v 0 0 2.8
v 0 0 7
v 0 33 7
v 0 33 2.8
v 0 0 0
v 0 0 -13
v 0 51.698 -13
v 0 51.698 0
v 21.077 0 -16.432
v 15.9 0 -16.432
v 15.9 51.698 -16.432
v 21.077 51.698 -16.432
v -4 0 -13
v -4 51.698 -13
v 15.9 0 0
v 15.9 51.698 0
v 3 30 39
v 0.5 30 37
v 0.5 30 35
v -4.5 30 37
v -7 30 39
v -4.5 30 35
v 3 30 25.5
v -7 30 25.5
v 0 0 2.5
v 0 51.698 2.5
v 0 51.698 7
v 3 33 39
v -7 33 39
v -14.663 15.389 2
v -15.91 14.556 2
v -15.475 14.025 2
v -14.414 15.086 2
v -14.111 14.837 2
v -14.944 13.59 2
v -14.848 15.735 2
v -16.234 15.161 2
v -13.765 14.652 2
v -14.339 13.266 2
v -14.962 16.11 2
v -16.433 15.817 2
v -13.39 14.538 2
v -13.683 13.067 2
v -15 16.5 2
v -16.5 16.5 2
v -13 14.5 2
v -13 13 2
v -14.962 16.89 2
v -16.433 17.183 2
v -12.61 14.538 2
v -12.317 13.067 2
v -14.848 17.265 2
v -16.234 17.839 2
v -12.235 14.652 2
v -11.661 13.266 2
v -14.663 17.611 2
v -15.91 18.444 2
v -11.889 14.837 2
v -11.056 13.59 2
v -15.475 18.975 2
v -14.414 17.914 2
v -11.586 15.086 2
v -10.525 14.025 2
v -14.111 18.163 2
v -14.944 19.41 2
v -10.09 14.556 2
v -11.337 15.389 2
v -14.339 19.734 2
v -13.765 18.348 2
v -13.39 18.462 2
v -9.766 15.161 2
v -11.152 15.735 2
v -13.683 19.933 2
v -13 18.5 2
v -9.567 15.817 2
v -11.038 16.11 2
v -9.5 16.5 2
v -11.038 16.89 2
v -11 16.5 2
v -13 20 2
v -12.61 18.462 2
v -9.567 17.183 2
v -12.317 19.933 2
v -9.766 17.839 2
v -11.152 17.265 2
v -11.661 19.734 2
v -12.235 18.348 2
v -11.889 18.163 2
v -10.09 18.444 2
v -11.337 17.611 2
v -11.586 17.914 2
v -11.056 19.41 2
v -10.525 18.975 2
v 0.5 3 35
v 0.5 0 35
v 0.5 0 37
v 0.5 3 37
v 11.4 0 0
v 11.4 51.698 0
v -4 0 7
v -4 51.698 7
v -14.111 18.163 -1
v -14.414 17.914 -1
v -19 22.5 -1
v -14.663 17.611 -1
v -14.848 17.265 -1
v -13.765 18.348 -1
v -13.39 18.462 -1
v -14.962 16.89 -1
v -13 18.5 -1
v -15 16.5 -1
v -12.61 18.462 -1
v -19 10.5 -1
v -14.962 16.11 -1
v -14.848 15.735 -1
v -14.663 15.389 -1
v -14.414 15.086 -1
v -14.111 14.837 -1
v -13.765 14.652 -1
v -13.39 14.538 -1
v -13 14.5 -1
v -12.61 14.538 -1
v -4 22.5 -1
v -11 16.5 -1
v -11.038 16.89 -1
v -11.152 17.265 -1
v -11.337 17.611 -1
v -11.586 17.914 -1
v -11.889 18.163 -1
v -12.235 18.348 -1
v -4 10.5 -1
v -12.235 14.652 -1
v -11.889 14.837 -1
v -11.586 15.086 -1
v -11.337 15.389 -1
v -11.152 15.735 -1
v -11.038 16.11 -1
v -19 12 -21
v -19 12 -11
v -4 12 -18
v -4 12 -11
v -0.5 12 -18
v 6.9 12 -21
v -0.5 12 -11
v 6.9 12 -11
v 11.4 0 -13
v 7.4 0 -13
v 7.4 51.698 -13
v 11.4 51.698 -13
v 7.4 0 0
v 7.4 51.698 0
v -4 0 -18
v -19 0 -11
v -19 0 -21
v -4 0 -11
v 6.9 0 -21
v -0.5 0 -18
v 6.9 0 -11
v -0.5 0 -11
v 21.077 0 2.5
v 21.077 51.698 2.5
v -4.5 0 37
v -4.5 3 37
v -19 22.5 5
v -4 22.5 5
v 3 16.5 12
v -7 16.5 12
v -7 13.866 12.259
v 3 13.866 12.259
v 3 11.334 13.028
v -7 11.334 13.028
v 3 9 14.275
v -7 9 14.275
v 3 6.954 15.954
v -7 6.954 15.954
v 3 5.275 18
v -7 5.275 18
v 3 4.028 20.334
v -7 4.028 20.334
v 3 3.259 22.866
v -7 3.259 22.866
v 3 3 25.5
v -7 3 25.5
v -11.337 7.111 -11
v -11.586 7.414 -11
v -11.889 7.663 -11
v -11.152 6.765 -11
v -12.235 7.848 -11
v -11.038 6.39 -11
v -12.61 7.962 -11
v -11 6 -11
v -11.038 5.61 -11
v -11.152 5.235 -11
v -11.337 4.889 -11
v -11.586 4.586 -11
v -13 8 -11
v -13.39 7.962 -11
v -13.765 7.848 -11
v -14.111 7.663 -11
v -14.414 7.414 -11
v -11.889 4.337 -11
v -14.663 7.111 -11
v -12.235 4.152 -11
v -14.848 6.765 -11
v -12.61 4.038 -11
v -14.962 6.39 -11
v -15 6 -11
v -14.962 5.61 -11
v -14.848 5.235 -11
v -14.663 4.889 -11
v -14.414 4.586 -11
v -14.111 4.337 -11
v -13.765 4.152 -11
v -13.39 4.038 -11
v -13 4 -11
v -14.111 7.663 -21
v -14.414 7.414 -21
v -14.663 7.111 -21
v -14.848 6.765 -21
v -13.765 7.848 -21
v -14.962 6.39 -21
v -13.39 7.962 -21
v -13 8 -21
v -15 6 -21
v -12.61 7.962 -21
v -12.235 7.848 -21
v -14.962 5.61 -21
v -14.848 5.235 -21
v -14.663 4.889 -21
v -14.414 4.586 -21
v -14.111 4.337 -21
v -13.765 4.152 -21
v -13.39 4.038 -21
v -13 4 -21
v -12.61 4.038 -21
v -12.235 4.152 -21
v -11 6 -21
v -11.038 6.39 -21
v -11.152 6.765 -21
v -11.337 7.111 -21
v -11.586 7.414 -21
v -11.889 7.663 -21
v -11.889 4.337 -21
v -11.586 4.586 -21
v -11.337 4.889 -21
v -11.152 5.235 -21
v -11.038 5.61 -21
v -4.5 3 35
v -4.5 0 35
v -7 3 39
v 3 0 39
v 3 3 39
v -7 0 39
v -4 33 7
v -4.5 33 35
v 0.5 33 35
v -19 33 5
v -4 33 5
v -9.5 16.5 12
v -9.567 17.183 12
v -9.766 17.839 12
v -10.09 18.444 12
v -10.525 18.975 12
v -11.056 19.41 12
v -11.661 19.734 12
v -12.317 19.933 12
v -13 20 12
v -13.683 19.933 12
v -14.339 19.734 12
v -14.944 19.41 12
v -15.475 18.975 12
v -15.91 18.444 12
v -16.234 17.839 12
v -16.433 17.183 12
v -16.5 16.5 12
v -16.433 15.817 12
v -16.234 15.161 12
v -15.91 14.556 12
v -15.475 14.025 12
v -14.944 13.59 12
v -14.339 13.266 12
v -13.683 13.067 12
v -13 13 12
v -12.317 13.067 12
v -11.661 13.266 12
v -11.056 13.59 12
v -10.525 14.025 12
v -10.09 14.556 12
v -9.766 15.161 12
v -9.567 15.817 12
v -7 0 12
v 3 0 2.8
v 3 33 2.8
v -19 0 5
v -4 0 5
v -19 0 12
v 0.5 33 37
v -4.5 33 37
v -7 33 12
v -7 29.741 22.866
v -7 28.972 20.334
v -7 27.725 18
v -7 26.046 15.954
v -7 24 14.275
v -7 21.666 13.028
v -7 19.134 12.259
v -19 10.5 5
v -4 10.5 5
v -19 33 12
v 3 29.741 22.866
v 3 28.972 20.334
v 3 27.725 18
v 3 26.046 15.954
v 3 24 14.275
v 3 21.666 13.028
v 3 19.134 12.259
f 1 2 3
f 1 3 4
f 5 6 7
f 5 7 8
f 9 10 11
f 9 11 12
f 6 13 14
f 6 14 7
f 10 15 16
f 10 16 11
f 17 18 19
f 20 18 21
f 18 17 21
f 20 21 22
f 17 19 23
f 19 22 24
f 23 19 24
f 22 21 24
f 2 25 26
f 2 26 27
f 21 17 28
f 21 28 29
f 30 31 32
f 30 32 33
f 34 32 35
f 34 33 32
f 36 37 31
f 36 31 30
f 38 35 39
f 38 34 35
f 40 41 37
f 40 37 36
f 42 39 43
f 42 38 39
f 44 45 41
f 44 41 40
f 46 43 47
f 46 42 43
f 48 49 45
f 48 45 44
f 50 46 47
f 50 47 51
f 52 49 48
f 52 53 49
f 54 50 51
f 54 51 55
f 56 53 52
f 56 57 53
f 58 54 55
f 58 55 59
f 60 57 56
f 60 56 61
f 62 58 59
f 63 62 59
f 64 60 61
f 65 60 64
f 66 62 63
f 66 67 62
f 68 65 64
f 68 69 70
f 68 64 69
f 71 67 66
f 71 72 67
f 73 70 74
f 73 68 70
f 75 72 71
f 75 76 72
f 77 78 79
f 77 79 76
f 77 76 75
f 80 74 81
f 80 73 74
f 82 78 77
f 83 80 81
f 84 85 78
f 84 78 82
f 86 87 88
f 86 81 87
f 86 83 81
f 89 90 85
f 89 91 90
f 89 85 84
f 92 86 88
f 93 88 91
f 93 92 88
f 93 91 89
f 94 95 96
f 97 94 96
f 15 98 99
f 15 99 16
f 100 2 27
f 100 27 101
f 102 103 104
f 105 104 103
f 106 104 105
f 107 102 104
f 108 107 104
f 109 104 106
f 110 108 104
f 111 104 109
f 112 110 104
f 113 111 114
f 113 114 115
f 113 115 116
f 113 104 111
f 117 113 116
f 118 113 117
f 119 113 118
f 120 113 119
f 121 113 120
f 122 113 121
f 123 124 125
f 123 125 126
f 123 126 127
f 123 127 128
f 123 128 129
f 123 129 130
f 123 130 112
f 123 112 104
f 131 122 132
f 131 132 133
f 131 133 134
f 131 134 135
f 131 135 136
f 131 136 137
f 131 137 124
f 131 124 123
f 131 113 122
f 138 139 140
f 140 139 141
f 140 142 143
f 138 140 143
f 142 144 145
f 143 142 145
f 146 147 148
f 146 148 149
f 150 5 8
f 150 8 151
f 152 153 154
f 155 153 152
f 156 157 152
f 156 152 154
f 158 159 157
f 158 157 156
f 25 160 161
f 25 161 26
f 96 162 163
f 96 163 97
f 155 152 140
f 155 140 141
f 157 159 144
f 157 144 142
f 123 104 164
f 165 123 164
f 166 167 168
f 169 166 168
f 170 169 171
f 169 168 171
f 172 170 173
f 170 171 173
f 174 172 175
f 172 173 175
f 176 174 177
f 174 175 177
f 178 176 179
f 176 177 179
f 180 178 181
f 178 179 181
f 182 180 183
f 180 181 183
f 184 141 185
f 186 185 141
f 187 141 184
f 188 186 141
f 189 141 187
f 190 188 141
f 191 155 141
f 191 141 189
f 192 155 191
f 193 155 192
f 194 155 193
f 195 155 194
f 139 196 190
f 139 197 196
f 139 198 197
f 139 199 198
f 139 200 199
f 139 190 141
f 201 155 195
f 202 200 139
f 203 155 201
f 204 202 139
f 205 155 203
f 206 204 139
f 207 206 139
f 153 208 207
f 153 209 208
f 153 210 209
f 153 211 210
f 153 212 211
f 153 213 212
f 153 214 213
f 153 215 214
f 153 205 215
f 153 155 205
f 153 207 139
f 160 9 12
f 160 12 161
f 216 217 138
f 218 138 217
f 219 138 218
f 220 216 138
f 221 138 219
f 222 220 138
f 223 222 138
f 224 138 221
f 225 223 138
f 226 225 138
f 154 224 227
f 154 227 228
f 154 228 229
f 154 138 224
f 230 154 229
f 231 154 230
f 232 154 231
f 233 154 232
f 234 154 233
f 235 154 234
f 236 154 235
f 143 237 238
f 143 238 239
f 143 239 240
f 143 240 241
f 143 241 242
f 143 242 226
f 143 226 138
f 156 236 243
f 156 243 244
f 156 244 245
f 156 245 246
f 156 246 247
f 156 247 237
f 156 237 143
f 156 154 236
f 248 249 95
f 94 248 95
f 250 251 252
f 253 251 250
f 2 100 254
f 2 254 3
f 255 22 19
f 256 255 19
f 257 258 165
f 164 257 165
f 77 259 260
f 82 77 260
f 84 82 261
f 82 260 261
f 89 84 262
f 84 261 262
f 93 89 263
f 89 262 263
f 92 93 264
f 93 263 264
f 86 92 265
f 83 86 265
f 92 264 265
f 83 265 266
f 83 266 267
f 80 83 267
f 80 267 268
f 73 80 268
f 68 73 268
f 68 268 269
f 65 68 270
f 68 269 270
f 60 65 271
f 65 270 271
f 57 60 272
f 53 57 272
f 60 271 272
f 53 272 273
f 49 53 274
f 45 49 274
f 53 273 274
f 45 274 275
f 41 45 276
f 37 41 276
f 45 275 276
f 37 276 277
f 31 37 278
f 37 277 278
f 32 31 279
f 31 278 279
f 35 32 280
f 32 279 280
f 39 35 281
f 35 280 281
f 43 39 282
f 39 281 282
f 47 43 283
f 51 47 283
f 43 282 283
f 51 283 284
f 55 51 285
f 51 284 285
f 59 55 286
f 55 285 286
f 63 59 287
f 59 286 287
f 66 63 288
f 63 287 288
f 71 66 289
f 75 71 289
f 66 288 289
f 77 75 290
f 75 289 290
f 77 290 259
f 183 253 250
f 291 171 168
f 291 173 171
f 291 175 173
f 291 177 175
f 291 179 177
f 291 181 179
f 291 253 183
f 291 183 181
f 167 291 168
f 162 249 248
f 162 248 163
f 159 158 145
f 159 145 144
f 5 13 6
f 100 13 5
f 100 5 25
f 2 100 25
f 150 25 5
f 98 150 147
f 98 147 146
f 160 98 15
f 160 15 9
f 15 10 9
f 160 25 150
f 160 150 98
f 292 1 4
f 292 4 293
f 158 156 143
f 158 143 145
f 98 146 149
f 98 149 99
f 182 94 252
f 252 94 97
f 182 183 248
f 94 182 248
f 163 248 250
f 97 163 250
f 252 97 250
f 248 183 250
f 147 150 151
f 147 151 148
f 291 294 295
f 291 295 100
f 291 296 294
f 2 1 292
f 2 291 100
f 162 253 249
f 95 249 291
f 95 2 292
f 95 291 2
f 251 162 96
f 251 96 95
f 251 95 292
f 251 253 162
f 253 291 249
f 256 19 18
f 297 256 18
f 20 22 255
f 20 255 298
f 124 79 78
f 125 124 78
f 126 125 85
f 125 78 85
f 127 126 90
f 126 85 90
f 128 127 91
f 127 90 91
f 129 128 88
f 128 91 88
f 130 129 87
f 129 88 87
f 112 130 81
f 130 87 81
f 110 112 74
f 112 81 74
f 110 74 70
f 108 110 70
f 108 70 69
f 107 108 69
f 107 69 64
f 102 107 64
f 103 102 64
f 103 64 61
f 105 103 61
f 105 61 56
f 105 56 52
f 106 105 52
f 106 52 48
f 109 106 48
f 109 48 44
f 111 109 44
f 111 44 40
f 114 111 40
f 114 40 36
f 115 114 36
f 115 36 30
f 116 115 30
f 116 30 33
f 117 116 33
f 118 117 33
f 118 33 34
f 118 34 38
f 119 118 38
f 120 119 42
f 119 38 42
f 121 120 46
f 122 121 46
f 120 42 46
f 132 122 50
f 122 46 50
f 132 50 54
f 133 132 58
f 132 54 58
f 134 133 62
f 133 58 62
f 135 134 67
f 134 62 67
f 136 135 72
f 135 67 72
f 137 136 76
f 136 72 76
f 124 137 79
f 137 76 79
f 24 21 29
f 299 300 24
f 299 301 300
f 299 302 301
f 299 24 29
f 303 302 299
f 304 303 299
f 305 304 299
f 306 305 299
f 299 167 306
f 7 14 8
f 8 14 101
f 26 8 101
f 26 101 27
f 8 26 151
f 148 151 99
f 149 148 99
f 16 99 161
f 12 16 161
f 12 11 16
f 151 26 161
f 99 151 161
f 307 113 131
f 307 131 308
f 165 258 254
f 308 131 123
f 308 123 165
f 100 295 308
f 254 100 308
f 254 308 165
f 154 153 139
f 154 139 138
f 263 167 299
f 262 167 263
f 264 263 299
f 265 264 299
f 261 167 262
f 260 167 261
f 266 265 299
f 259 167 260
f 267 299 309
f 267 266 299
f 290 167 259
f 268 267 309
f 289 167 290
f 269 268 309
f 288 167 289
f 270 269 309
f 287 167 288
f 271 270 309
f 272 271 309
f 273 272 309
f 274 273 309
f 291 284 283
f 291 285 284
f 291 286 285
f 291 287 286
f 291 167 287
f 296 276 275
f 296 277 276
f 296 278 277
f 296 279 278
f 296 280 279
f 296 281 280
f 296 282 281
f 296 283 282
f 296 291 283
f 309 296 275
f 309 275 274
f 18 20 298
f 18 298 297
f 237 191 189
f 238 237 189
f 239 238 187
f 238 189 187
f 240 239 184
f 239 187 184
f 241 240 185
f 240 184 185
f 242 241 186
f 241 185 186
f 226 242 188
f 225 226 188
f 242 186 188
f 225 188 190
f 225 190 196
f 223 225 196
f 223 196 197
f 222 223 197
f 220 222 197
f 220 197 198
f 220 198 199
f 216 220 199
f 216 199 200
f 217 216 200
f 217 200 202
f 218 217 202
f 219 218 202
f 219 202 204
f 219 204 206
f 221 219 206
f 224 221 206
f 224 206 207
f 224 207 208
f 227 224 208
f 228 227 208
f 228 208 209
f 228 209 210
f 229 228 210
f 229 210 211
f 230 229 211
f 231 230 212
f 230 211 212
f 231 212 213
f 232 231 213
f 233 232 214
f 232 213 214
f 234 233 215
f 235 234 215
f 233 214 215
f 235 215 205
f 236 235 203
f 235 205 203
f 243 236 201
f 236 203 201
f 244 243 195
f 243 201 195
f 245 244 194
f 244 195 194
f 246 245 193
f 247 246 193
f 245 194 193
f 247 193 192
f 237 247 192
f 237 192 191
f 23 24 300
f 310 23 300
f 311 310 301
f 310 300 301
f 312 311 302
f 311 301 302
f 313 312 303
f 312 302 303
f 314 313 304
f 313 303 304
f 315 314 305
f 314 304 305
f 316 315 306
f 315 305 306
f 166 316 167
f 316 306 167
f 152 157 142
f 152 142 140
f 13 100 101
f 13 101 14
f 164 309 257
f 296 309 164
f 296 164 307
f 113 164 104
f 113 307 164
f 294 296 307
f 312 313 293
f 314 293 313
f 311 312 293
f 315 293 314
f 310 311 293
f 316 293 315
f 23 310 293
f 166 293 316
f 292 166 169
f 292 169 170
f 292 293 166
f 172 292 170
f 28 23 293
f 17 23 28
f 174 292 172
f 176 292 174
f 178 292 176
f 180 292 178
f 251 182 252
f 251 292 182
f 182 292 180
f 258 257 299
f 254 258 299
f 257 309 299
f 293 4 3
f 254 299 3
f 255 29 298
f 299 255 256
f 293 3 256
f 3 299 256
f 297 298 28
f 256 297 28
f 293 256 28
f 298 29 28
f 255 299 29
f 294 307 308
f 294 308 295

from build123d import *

# Parameters (mm, degrees)
F1_DEPTH  = 51.69827
F3_DEPTH  = 33
F4_DEPTH  = 12
F5_R      = 2
F6_DEPTH  = 10.001
F7_R      = 2
F8_DEPTH  = 33.001
F7_R_2    = 3.5
F9_DEPTH  = 10
F11_DEPTH = 28.078453
F12_W     = 5
F12_H     = 2
F13_DEPTH = 51.69927
F14_W     = 10.5
F14_H     = 6
F15_DEPTH = 15


with BuildPart() as f1:
    # F0 (on Front) → F1 (new body)
    with BuildSketch(Plane.XZ):
        Polygon((0, -13), (0, 0), (7.4, 0), (7.4, -13), (11.4, -13), (11.4, 0), (15.9, 0), (15.9, -16.432262), (21.077453, -16.432262), (21.077453, 2.5), (0, 2.5), (0, 7), (-4, 7), (-4, -13), align=None)
    extrude(amount=-F1_DEPTH)


with BuildPart() as f3:
    # F2 (on Front) → F3 (new body)
    with BuildSketch(Plane.XZ):
        Polygon((-4, -1), (-4, 7), (0, 7), (0, 2.8), (3, 2.8), (3, 39), (-7, 39), (-7, 12), (-19, 12), (-19, -1), align=None)
    extrude(amount=-F3_DEPTH)

    # F7 (on face) → F8 (cut, through all)
    with BuildSketch(Plane.XY.offset(12)):
        with Locations((-13, 16.5)):
            Circle(F7_R)
    extrude(amount=-F8_DEPTH, mode=Mode.SUBTRACT)

    # F7 (on face) → F9 (cut)
    with BuildSketch(Plane.XY.offset(12)):
        with Locations((-13, 16.5)):
            Circle(F7_R_2)
        with Locations((-13, 16.5)):
            Circle(F7_R, mode=Mode.SUBTRACT)
    extrude(amount=-F9_DEPTH, mode=Mode.SUBTRACT)

    # F10 (on face) → F11 (cut, through all)
    with BuildSketch(Plane(origin=(-7, 0, 0), x_dir=(0, -1, 0), z_dir=(-1, 0, 0))):
        with BuildLine():
            Line((-3, 39), (-30, 39))
            Line((-30, 39), (-30, 25.5))
            ThreePointArc((-30, 25.5), (-26.045942, 15.954058), (-16.5, 12))
            ThreePointArc((-16.5, 12), (-6.954058, 15.954058), (-3, 25.5))
            Line((-3, 25.5), (-3, 39))
        make_face()
    extrude(amount=-F11_DEPTH, mode=Mode.SUBTRACT)

    # F12 (on face) → F13 (cut, through all)
    with BuildSketch(Plane.XZ):
        with Locations((-2, 36)):
            Rectangle(F12_W, F12_H)
    extrude(amount=-F13_DEPTH, mode=Mode.SUBTRACT)

    # F14 (on face) → F15 (cut, through all)
    with BuildSketch(Plane(origin=(-19, 0, 0), x_dir=(0, -1, 0), z_dir=(-1, 0, 0))):
        with Locations((-27.75, 2)):
            Rectangle(F14_W, F14_H)
        with Locations((-5.25, 2)):
            Rectangle(F14_W, F14_H)
    extrude(amount=-F15_DEPTH, mode=Mode.SUBTRACT)


with BuildPart() as f4:
    # F2 (on Front) → F4 (new body)
    with BuildSketch(Plane.XZ):
        Polygon((-0.5, -11), (-0.5, -18), (-4, -18), (-4, -11), (-19, -11), (-19, -21), (6.9, -21), (6.9, -11), align=None)
    extrude(amount=-F4_DEPTH)

    # F5 (on face) → F6 (cut, through all)
    with BuildSketch(Plane.XY.offset(-11)):
        with Locations((-13, 6)):
            Circle(F5_R)
    extrude(amount=-F6_DEPTH, mode=Mode.SUBTRACT)


solid = Compound([f1.part, f3.part, f4.part])
